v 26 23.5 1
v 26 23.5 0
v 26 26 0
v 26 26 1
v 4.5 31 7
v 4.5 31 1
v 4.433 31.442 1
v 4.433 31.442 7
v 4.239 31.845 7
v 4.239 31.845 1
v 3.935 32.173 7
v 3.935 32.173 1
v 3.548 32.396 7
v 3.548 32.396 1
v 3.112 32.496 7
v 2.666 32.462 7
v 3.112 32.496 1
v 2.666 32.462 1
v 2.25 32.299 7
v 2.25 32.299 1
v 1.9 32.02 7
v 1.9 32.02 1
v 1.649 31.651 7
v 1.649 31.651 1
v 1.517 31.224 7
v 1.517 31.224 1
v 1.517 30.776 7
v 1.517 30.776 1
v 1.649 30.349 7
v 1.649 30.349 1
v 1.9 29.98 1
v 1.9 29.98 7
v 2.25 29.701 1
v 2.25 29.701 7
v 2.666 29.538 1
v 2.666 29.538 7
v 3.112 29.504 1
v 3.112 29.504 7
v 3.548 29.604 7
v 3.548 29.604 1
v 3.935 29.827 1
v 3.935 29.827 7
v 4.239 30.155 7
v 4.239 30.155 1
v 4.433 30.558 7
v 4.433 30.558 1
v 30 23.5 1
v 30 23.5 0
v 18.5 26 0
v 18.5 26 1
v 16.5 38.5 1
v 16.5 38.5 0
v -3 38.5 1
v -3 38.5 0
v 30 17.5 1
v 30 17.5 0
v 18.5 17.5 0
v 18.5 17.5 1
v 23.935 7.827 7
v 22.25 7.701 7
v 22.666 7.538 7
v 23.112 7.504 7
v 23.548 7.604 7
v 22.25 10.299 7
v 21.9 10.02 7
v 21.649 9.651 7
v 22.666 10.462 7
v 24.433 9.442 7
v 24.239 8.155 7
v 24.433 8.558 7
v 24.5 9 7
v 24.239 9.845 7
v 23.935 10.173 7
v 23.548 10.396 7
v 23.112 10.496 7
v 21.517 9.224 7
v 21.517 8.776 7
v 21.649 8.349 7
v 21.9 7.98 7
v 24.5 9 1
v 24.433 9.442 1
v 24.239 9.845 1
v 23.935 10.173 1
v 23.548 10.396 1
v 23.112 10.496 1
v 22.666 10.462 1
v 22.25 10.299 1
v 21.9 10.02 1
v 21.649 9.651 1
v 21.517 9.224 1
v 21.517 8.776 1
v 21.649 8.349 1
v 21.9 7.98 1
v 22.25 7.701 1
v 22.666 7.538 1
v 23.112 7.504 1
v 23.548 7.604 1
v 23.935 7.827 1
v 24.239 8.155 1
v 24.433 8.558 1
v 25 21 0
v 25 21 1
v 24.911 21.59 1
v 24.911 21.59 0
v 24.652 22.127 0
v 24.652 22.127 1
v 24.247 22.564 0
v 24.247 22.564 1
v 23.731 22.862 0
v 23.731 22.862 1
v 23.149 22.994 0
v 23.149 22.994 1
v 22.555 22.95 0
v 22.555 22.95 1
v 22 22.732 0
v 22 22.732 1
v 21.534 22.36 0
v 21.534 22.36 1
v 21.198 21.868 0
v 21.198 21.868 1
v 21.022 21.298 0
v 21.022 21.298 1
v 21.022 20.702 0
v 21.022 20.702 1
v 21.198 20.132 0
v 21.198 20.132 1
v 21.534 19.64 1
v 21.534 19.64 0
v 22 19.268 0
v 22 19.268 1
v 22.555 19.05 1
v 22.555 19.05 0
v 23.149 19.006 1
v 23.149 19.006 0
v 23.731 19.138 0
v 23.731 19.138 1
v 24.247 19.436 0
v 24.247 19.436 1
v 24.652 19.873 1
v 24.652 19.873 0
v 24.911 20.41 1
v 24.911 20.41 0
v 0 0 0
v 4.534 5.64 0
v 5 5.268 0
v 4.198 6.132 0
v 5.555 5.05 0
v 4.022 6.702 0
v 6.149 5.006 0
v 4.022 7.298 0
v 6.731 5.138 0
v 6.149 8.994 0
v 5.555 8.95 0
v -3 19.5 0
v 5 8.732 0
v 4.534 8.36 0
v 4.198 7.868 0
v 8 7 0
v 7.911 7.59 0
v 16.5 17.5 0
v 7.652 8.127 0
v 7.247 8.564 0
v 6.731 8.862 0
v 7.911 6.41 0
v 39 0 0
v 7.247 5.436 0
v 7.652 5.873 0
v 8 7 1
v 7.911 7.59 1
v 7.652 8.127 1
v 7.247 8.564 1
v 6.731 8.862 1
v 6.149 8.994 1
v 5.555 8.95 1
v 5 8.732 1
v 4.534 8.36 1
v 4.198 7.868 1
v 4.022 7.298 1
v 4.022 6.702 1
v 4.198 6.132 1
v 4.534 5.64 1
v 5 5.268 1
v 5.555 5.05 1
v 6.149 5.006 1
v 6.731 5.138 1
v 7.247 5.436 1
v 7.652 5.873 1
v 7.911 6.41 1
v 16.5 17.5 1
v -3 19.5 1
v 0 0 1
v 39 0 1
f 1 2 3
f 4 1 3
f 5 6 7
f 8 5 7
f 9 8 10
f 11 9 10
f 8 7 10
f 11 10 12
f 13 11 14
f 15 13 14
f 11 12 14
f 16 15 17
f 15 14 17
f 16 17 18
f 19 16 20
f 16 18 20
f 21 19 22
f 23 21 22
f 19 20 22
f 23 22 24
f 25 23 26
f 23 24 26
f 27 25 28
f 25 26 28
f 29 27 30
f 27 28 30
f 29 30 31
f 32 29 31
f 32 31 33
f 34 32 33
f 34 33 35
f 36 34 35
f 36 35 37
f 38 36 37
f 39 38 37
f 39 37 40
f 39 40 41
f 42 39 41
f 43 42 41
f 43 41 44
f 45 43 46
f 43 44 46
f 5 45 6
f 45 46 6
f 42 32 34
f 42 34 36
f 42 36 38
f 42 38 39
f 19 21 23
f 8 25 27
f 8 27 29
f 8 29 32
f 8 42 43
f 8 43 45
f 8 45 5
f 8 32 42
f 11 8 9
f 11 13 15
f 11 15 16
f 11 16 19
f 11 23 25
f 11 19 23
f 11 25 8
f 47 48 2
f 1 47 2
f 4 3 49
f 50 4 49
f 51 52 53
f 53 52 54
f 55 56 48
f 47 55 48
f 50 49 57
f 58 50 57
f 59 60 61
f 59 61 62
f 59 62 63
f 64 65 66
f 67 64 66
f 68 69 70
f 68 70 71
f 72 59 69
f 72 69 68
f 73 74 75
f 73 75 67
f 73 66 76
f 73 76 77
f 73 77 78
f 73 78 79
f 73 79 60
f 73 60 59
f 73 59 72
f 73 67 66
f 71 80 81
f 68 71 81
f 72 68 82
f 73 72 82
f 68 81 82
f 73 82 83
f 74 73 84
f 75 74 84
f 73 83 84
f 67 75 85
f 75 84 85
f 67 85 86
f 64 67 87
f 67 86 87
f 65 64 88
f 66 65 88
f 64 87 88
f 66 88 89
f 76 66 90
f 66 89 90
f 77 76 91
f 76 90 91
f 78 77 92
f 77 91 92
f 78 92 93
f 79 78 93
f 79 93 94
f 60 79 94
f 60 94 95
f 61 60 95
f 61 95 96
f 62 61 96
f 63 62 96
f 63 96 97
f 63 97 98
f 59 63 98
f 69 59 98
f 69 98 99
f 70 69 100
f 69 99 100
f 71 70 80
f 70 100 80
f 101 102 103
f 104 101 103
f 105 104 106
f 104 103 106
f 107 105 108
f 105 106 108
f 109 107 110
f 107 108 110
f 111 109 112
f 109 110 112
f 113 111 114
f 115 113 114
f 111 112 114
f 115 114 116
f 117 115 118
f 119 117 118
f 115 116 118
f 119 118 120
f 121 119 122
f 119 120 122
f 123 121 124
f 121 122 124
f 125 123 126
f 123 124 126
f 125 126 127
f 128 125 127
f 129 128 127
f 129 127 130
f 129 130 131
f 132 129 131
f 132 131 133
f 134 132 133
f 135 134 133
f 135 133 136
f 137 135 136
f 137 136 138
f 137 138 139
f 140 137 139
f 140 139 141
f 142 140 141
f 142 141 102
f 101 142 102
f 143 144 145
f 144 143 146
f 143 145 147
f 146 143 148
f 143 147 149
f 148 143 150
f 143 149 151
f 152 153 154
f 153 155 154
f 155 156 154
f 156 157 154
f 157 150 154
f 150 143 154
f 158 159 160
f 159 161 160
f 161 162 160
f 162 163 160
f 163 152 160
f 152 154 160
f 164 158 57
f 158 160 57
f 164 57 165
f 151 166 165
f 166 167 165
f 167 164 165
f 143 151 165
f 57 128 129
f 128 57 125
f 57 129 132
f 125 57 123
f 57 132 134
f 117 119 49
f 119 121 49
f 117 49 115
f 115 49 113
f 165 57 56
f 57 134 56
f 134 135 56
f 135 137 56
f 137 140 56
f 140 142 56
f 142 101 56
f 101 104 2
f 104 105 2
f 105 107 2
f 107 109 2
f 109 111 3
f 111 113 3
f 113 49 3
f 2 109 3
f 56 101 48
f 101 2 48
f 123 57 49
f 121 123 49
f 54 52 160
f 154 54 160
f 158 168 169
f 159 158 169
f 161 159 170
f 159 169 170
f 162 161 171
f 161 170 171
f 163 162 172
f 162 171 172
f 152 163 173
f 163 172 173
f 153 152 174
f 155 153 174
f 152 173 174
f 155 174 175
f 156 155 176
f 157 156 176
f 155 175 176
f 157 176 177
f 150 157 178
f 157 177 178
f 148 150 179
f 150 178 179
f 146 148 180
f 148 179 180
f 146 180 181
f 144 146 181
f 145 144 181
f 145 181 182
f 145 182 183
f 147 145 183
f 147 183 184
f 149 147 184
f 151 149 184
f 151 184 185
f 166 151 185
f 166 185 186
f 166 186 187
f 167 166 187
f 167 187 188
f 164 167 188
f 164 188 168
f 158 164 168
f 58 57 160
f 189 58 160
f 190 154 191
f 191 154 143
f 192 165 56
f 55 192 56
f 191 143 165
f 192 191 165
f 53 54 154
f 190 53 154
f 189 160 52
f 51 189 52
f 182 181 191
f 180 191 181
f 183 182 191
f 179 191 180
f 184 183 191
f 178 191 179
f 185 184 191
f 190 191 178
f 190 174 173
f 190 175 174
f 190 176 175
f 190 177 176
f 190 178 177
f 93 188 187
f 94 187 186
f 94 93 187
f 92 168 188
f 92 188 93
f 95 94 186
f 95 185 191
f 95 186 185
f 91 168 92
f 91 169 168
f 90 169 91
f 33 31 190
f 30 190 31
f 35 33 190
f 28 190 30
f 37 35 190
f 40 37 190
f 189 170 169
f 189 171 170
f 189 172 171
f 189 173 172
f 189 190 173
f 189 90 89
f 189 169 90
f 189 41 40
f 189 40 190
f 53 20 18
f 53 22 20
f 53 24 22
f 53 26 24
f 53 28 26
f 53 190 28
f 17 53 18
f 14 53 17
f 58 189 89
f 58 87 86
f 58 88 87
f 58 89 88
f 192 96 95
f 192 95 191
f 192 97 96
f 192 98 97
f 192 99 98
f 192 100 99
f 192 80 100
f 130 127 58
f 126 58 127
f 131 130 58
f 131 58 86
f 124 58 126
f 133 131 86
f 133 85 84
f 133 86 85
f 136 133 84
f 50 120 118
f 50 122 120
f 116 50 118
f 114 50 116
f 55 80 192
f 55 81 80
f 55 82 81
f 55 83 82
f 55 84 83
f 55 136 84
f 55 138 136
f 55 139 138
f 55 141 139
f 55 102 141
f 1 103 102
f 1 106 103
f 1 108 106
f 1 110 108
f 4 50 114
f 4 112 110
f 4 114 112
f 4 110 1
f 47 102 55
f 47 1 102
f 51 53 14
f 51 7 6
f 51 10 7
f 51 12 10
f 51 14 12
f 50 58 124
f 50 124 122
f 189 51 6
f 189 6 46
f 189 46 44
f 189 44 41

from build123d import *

# Parameters (mm, degrees)
PAD_DEPTH    = 1
SKETCH001_R  = 1.5
PAD001_DEPTH = 6
SKETCH002_R  = 2
POCKET_DEPTH = 1.001


with BuildPart() as part:
    # Sketch → Pad (new body)
    with BuildSketch(Plane.XY):
        Polygon((0, 0), (39, 0), (30, 17.5), (30, 23.5), (26, 23.5), (26, 26), (18.5, 26), (18.5, 17.5), (16.5, 17.5), (16.5, 38.5), (-3, 38.5), (-3, 19.5), align=None)
    extrude(amount=PAD_DEPTH)

    # Sketch001 (on Face14 of Pad) → Pad001 (join)
    with BuildSketch(Plane.XY.offset(1)):
        with Locations((3, 31)):
            Circle(SKETCH001_R)
        with Locations((23, 9)):
            Circle(SKETCH001_R)
    extrude(amount=PAD001_DEPTH)

    # Sketch002 (on Face5 of Pad001) → Pocket (cut, through all)
    with BuildSketch(Plane.XY.offset(1)):
        with Locations((6, 7)):
            Circle(SKETCH002_R)
        with Locations((23, 21)):
            Circle(SKETCH002_R)
    extrude(amount=-POCKET_DEPTH, mode=Mode.SUBTRACT)


solid = part.part
